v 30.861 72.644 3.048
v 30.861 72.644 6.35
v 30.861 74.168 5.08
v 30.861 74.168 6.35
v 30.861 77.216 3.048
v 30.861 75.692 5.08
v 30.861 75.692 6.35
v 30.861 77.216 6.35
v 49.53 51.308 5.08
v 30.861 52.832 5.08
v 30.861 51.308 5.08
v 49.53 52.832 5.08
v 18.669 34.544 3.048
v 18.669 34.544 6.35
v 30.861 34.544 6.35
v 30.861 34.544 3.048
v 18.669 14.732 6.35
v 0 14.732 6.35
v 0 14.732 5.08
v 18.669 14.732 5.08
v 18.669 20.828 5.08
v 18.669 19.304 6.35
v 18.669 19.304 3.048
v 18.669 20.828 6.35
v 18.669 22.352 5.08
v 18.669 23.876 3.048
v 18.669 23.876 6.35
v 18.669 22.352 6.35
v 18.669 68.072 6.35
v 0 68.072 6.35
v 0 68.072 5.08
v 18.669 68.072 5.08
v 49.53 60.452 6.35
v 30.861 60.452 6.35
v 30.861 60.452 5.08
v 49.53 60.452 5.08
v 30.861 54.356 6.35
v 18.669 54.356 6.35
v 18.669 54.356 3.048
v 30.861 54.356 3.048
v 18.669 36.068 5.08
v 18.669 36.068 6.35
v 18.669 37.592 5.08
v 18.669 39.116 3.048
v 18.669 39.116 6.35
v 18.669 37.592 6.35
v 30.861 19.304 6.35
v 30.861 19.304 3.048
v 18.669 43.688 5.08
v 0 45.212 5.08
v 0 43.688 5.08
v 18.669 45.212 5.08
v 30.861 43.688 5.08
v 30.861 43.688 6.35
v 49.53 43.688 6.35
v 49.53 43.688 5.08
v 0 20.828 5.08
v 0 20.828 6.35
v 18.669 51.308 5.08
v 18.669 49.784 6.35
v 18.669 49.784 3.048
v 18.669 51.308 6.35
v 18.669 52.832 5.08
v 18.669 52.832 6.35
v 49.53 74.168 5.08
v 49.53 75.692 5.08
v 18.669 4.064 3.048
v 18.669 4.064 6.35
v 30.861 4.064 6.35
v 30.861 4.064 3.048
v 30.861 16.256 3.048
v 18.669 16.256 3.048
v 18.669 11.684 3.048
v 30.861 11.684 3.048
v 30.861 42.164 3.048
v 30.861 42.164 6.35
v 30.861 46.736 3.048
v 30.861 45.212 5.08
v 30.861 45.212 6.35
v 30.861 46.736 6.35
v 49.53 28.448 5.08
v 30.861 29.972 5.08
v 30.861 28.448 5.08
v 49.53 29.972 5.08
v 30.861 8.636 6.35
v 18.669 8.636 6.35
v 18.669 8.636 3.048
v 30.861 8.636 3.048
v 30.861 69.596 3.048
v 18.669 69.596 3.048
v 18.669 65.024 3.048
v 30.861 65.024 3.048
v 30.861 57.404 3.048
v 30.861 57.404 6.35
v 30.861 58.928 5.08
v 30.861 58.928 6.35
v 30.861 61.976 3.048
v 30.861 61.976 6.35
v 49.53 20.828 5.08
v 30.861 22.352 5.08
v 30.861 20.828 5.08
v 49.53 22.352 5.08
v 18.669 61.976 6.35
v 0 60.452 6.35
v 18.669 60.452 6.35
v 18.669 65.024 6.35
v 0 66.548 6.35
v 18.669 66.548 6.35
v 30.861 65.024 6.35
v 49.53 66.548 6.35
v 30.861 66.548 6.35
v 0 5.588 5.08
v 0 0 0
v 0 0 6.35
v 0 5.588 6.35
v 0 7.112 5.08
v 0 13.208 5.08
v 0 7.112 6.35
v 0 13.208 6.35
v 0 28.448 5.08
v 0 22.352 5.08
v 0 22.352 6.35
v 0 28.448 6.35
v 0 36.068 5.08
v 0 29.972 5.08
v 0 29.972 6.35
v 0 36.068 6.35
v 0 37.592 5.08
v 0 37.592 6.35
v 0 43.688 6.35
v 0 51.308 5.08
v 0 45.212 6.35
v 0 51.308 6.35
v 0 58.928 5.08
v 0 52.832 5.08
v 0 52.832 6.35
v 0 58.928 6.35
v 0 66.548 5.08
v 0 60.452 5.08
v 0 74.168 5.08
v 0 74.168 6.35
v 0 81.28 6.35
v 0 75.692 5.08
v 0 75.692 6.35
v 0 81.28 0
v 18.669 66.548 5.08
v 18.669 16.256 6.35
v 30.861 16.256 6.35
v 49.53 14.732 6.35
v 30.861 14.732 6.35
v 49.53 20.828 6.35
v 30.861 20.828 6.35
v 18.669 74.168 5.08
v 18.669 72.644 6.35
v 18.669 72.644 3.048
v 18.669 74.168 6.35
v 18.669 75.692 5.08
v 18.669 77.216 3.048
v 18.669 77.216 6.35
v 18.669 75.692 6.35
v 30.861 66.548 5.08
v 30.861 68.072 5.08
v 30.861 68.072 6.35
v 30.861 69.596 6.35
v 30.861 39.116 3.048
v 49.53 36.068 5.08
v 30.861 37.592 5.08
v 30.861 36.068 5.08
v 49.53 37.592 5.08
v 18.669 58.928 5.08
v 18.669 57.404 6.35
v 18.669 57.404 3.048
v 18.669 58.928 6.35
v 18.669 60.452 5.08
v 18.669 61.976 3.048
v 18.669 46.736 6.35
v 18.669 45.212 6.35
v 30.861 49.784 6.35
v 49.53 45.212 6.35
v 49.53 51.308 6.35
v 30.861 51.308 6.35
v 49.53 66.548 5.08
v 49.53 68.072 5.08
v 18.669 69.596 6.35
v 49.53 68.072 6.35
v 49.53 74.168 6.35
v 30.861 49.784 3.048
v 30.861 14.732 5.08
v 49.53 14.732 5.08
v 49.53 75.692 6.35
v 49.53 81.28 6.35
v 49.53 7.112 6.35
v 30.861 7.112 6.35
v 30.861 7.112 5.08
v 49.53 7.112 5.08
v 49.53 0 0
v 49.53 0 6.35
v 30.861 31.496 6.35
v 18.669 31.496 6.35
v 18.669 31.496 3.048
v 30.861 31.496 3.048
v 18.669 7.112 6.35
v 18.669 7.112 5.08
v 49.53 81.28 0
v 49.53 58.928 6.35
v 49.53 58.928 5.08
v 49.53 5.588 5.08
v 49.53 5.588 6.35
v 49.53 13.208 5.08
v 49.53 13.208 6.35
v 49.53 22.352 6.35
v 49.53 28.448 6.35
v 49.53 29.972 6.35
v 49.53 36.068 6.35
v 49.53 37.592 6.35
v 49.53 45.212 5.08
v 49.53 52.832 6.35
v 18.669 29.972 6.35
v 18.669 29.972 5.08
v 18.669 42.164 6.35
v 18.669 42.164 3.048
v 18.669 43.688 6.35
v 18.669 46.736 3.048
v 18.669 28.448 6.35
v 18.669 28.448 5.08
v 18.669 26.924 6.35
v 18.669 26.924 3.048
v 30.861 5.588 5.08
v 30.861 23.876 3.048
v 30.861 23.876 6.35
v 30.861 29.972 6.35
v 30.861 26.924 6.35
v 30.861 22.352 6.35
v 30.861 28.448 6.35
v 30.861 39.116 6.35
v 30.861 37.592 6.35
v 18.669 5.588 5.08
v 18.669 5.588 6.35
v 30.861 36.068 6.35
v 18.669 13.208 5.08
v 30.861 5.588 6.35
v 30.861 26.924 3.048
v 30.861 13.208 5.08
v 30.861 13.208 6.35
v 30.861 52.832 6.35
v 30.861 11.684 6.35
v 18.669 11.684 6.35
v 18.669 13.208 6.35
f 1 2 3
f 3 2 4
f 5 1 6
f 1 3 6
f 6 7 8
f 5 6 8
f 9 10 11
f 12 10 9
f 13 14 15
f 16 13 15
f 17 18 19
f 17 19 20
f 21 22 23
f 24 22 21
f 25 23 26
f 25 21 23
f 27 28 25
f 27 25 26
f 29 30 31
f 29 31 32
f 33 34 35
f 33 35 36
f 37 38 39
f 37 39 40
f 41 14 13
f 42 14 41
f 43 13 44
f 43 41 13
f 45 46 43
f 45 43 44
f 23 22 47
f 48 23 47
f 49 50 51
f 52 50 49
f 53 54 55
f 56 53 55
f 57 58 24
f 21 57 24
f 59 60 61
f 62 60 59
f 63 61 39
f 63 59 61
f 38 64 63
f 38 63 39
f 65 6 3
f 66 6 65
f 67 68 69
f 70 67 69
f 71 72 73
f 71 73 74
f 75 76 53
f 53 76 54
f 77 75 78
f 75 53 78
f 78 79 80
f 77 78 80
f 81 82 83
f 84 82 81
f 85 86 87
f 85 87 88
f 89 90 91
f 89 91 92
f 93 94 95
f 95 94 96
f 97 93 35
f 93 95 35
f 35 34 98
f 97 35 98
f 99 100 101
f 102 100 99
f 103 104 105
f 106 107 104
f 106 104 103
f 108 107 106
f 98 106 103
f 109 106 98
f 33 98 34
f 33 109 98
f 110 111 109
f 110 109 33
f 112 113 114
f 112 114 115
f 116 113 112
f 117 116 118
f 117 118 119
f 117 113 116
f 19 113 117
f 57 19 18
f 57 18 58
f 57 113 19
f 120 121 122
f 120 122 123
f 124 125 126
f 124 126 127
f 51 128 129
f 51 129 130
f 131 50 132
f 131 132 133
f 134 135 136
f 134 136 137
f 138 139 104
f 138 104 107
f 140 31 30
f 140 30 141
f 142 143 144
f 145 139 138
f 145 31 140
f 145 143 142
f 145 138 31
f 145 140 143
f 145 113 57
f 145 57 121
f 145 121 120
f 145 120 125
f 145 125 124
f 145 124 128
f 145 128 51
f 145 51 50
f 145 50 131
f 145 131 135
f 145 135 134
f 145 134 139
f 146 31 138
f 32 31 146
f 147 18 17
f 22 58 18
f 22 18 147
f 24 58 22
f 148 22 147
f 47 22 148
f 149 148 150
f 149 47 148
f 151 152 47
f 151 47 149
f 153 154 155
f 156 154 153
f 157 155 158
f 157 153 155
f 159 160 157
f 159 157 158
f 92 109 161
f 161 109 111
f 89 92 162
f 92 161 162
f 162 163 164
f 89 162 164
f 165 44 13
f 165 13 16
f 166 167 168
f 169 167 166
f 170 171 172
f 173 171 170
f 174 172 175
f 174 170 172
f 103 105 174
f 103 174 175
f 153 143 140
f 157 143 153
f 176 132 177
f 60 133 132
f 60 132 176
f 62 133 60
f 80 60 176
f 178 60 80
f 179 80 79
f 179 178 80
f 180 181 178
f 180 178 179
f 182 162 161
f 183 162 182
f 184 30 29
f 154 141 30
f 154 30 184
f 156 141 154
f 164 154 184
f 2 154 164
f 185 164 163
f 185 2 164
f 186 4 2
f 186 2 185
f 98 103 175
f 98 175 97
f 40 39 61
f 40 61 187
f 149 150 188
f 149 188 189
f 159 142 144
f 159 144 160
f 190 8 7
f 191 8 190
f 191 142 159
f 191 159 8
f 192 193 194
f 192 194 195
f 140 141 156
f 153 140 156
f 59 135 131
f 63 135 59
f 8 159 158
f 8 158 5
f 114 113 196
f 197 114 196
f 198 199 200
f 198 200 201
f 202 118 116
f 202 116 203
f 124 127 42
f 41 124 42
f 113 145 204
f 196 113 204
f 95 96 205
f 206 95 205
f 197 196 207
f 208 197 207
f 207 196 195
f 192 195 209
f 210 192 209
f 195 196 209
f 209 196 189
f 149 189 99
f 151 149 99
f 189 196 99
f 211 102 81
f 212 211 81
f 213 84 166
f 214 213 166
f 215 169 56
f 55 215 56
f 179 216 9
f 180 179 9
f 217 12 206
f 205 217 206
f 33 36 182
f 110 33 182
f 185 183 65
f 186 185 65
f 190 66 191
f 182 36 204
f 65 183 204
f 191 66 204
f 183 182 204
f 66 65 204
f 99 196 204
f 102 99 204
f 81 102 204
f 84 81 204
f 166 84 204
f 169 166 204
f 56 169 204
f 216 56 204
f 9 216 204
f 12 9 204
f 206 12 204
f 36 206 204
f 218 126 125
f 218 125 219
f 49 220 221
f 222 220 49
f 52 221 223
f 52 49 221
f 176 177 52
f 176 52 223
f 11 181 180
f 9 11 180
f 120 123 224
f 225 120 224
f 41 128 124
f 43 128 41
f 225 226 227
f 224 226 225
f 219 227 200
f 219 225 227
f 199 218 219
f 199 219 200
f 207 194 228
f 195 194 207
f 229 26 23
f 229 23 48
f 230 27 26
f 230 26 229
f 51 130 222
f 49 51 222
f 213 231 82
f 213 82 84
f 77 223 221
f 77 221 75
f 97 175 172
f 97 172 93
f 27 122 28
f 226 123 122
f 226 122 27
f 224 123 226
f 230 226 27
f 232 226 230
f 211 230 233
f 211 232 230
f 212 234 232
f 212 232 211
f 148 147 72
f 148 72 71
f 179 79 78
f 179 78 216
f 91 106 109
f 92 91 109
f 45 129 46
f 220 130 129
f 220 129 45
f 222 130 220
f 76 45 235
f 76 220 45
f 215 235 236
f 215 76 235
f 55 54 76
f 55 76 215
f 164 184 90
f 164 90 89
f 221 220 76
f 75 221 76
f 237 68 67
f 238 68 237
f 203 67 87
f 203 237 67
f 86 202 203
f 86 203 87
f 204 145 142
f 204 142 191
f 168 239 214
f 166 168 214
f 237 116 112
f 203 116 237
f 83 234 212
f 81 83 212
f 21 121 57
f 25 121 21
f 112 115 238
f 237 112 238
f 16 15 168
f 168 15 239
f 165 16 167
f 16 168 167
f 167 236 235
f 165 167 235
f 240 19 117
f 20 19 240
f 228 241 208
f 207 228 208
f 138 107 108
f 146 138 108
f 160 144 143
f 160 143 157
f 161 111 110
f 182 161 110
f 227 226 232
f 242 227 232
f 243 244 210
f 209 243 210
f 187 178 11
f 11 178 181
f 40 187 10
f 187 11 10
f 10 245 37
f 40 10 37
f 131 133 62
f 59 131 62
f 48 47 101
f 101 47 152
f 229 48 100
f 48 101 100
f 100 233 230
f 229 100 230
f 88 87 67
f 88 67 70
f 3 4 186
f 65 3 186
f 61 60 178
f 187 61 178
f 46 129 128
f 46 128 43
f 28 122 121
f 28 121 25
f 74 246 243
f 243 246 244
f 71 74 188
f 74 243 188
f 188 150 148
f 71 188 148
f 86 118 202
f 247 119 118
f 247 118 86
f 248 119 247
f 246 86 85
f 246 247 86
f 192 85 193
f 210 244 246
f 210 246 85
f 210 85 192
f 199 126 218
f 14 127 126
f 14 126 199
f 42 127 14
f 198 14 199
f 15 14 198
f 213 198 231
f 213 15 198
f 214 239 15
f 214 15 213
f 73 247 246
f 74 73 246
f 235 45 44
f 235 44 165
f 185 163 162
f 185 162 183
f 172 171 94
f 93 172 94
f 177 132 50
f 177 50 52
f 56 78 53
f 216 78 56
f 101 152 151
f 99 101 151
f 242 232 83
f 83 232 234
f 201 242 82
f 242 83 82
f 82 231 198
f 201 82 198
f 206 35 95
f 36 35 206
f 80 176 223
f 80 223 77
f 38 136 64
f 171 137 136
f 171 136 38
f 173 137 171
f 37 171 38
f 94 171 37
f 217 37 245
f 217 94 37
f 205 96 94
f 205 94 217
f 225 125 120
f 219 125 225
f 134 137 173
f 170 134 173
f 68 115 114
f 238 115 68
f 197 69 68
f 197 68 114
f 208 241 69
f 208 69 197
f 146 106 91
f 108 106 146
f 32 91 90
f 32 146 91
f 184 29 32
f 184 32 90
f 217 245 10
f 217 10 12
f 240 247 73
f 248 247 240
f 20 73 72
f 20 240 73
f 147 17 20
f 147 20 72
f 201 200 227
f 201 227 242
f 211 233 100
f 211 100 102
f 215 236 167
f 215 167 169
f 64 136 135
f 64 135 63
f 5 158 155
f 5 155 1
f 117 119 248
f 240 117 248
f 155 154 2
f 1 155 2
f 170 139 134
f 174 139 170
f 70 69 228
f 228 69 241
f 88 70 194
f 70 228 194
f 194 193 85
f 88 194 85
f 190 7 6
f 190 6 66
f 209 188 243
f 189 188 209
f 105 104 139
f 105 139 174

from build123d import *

# Parameters (mm, degrees)
F0_W     = 49.53
F0_H     = 81.28
F1_DEPTH = 6.35
F2_W     = 12.192
F2_H     = 4.572
F3_DEPTH = 3.302
F4_W     = 18.669
F4_H     = 1.524
F5_DEPTH = 1.27


with BuildPart() as f1:
    # F0 (on Top) → F1 (new body)
    with BuildSketch(Plane.XY):
        with Locations((24.765, 40.64)):
            Rectangle(F0_W, F0_H)
    extrude(amount=F1_DEPTH)

    # F2 (on face) → F3 (cut)
    with BuildSketch(Plane.XY.offset(6.35)):
        with Locations((24.765, 6.35)):
            Rectangle(F2_W, F2_H)
        with Locations((24.765, 13.97)):
            Rectangle(F2_W, F2_H)
        with Locations((24.765, 21.59)):
            Rectangle(F2_W, F2_H)
        with Locations((24.765, 29.21)):
            Rectangle(F2_W, F2_H)
        with Locations((24.765, 36.83)):
            Rectangle(F2_W, F2_H)
        with Locations((24.765, 44.45)):
            Rectangle(F2_W, F2_H)
        with Locations((24.765, 52.07)):
            Rectangle(F2_W, F2_H)
        with Locations((24.765, 59.69)):
            Rectangle(F2_W, F2_H)
        with Locations((24.765, 67.31)):
            Rectangle(F2_W, F2_H)
        with Locations((24.765, 74.93)):
            Rectangle(F2_W, F2_H)
    extrude(amount=-F3_DEPTH, mode=Mode.SUBTRACT)

    # F4 (on face) → F5 (cut)
    with BuildSketch(Plane.XY.offset(6.35)):
        with Locations((40.1955, 6.35)):
            Rectangle(F4_W, F4_H)
        with Locations((9.3345, 6.35)):
            Rectangle(F4_W, F4_H)
        with Locations((9.3345, 13.97)):
            Rectangle(F4_W, F4_H)
        with Locations((40.1955, 13.97)):
            Rectangle(F4_W, F4_H)
        with Locations((9.3345, 21.59)):
            Rectangle(F4_W, F4_H)
        with Locations((40.1955, 21.59)):
            Rectangle(F4_W, F4_H)
        with Locations((9.3345, 29.21)):
            Rectangle(F4_W, F4_H)
        with Locations((40.1955, 29.21)):
            Rectangle(F4_W, F4_H)
        with Locations((9.3345, 36.83)):
            Rectangle(F4_W, F4_H)
        with Locations((40.1955, 36.83)):
            Rectangle(F4_W, F4_H)
        with Locations((9.3345, 44.45)):
            Rectangle(F4_W, F4_H)
        with Locations((40.1955, 44.45)):
            Rectangle(F4_W, F4_H)
        with Locations((9.3345, 52.07)):
            Rectangle(F4_W, F4_H)
        with Locations((40.1955, 52.07)):
            Rectangle(F4_W, F4_H)
        with Locations((9.3345, 59.69)):
            Rectangle(F4_W, F4_H)
        with Locations((40.1955, 59.69)):
            Rectangle(F4_W, F4_H)
        with Locations((9.3345, 67.31)):
            Rectangle(F4_W, F4_H)
        with Locations((40.1955, 67.31)):
            Rectangle(F4_W, F4_H)
        with Locations((9.3345, 74.93)):
            Rectangle(F4_W, F4_H)
        with Locations((40.1955, 74.93)):
            Rectangle(F4_W, F4_H)
    extrude(amount=-F5_DEPTH, mode=Mode.SUBTRACT)


solid = f1.part
